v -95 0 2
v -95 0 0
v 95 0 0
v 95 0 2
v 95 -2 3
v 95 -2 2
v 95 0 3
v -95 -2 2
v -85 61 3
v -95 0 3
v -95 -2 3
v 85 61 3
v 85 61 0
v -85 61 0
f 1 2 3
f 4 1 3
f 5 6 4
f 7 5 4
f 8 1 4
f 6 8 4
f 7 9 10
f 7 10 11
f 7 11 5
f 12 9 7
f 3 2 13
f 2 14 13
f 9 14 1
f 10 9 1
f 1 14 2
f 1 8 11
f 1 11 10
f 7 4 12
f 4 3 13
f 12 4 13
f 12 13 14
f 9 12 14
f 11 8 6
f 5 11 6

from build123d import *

# Parameters (mm, degrees)
EXTRUDE001_DEPTH = 1
EXTRUDE_DEPTH    = 2
BOX_W            = 190
BOX_H            = 2
BOX_DEPTH        = 1


with BuildPart() as extrude001:
    # Sketch001 → Extrude001 (new body)
    with BuildSketch(Plane.XY):
        Polygon((-95, 0), (95, 0), (85, 61), (-85, 61), align=None)
    extrude(amount=EXTRUDE001_DEPTH)


with BuildPart() as extrude001_1:
    # Extrude001 placement: moved
    add(extrude001.part.moved(Location((0, 0, 2))))


with BuildPart() as extrude_body:
    # Sketch → Extrude (new body)
    with BuildSketch(Plane.XY):
        Polygon((-95, 0), (95, 0), (85, 61), (-85, 61), align=None)
    extrude(amount=EXTRUDE_DEPTH)


with BuildPart() as fusion:
    # Box → Box (new body)
    with BuildSketch(Plane(origin=(-95, -2, 2), x_dir=(1, 0, 0), z_dir=(0, 0, 1))):
        with Locations((95, 1)):
            Rectangle(BOX_W, BOX_H)
    extrude(amount=BOX_DEPTH)

    # Fusion: union Extrude001, Extrude body
    add(extrude001_1.part)
    add(extrude_body.part)


solid = fusion.part
